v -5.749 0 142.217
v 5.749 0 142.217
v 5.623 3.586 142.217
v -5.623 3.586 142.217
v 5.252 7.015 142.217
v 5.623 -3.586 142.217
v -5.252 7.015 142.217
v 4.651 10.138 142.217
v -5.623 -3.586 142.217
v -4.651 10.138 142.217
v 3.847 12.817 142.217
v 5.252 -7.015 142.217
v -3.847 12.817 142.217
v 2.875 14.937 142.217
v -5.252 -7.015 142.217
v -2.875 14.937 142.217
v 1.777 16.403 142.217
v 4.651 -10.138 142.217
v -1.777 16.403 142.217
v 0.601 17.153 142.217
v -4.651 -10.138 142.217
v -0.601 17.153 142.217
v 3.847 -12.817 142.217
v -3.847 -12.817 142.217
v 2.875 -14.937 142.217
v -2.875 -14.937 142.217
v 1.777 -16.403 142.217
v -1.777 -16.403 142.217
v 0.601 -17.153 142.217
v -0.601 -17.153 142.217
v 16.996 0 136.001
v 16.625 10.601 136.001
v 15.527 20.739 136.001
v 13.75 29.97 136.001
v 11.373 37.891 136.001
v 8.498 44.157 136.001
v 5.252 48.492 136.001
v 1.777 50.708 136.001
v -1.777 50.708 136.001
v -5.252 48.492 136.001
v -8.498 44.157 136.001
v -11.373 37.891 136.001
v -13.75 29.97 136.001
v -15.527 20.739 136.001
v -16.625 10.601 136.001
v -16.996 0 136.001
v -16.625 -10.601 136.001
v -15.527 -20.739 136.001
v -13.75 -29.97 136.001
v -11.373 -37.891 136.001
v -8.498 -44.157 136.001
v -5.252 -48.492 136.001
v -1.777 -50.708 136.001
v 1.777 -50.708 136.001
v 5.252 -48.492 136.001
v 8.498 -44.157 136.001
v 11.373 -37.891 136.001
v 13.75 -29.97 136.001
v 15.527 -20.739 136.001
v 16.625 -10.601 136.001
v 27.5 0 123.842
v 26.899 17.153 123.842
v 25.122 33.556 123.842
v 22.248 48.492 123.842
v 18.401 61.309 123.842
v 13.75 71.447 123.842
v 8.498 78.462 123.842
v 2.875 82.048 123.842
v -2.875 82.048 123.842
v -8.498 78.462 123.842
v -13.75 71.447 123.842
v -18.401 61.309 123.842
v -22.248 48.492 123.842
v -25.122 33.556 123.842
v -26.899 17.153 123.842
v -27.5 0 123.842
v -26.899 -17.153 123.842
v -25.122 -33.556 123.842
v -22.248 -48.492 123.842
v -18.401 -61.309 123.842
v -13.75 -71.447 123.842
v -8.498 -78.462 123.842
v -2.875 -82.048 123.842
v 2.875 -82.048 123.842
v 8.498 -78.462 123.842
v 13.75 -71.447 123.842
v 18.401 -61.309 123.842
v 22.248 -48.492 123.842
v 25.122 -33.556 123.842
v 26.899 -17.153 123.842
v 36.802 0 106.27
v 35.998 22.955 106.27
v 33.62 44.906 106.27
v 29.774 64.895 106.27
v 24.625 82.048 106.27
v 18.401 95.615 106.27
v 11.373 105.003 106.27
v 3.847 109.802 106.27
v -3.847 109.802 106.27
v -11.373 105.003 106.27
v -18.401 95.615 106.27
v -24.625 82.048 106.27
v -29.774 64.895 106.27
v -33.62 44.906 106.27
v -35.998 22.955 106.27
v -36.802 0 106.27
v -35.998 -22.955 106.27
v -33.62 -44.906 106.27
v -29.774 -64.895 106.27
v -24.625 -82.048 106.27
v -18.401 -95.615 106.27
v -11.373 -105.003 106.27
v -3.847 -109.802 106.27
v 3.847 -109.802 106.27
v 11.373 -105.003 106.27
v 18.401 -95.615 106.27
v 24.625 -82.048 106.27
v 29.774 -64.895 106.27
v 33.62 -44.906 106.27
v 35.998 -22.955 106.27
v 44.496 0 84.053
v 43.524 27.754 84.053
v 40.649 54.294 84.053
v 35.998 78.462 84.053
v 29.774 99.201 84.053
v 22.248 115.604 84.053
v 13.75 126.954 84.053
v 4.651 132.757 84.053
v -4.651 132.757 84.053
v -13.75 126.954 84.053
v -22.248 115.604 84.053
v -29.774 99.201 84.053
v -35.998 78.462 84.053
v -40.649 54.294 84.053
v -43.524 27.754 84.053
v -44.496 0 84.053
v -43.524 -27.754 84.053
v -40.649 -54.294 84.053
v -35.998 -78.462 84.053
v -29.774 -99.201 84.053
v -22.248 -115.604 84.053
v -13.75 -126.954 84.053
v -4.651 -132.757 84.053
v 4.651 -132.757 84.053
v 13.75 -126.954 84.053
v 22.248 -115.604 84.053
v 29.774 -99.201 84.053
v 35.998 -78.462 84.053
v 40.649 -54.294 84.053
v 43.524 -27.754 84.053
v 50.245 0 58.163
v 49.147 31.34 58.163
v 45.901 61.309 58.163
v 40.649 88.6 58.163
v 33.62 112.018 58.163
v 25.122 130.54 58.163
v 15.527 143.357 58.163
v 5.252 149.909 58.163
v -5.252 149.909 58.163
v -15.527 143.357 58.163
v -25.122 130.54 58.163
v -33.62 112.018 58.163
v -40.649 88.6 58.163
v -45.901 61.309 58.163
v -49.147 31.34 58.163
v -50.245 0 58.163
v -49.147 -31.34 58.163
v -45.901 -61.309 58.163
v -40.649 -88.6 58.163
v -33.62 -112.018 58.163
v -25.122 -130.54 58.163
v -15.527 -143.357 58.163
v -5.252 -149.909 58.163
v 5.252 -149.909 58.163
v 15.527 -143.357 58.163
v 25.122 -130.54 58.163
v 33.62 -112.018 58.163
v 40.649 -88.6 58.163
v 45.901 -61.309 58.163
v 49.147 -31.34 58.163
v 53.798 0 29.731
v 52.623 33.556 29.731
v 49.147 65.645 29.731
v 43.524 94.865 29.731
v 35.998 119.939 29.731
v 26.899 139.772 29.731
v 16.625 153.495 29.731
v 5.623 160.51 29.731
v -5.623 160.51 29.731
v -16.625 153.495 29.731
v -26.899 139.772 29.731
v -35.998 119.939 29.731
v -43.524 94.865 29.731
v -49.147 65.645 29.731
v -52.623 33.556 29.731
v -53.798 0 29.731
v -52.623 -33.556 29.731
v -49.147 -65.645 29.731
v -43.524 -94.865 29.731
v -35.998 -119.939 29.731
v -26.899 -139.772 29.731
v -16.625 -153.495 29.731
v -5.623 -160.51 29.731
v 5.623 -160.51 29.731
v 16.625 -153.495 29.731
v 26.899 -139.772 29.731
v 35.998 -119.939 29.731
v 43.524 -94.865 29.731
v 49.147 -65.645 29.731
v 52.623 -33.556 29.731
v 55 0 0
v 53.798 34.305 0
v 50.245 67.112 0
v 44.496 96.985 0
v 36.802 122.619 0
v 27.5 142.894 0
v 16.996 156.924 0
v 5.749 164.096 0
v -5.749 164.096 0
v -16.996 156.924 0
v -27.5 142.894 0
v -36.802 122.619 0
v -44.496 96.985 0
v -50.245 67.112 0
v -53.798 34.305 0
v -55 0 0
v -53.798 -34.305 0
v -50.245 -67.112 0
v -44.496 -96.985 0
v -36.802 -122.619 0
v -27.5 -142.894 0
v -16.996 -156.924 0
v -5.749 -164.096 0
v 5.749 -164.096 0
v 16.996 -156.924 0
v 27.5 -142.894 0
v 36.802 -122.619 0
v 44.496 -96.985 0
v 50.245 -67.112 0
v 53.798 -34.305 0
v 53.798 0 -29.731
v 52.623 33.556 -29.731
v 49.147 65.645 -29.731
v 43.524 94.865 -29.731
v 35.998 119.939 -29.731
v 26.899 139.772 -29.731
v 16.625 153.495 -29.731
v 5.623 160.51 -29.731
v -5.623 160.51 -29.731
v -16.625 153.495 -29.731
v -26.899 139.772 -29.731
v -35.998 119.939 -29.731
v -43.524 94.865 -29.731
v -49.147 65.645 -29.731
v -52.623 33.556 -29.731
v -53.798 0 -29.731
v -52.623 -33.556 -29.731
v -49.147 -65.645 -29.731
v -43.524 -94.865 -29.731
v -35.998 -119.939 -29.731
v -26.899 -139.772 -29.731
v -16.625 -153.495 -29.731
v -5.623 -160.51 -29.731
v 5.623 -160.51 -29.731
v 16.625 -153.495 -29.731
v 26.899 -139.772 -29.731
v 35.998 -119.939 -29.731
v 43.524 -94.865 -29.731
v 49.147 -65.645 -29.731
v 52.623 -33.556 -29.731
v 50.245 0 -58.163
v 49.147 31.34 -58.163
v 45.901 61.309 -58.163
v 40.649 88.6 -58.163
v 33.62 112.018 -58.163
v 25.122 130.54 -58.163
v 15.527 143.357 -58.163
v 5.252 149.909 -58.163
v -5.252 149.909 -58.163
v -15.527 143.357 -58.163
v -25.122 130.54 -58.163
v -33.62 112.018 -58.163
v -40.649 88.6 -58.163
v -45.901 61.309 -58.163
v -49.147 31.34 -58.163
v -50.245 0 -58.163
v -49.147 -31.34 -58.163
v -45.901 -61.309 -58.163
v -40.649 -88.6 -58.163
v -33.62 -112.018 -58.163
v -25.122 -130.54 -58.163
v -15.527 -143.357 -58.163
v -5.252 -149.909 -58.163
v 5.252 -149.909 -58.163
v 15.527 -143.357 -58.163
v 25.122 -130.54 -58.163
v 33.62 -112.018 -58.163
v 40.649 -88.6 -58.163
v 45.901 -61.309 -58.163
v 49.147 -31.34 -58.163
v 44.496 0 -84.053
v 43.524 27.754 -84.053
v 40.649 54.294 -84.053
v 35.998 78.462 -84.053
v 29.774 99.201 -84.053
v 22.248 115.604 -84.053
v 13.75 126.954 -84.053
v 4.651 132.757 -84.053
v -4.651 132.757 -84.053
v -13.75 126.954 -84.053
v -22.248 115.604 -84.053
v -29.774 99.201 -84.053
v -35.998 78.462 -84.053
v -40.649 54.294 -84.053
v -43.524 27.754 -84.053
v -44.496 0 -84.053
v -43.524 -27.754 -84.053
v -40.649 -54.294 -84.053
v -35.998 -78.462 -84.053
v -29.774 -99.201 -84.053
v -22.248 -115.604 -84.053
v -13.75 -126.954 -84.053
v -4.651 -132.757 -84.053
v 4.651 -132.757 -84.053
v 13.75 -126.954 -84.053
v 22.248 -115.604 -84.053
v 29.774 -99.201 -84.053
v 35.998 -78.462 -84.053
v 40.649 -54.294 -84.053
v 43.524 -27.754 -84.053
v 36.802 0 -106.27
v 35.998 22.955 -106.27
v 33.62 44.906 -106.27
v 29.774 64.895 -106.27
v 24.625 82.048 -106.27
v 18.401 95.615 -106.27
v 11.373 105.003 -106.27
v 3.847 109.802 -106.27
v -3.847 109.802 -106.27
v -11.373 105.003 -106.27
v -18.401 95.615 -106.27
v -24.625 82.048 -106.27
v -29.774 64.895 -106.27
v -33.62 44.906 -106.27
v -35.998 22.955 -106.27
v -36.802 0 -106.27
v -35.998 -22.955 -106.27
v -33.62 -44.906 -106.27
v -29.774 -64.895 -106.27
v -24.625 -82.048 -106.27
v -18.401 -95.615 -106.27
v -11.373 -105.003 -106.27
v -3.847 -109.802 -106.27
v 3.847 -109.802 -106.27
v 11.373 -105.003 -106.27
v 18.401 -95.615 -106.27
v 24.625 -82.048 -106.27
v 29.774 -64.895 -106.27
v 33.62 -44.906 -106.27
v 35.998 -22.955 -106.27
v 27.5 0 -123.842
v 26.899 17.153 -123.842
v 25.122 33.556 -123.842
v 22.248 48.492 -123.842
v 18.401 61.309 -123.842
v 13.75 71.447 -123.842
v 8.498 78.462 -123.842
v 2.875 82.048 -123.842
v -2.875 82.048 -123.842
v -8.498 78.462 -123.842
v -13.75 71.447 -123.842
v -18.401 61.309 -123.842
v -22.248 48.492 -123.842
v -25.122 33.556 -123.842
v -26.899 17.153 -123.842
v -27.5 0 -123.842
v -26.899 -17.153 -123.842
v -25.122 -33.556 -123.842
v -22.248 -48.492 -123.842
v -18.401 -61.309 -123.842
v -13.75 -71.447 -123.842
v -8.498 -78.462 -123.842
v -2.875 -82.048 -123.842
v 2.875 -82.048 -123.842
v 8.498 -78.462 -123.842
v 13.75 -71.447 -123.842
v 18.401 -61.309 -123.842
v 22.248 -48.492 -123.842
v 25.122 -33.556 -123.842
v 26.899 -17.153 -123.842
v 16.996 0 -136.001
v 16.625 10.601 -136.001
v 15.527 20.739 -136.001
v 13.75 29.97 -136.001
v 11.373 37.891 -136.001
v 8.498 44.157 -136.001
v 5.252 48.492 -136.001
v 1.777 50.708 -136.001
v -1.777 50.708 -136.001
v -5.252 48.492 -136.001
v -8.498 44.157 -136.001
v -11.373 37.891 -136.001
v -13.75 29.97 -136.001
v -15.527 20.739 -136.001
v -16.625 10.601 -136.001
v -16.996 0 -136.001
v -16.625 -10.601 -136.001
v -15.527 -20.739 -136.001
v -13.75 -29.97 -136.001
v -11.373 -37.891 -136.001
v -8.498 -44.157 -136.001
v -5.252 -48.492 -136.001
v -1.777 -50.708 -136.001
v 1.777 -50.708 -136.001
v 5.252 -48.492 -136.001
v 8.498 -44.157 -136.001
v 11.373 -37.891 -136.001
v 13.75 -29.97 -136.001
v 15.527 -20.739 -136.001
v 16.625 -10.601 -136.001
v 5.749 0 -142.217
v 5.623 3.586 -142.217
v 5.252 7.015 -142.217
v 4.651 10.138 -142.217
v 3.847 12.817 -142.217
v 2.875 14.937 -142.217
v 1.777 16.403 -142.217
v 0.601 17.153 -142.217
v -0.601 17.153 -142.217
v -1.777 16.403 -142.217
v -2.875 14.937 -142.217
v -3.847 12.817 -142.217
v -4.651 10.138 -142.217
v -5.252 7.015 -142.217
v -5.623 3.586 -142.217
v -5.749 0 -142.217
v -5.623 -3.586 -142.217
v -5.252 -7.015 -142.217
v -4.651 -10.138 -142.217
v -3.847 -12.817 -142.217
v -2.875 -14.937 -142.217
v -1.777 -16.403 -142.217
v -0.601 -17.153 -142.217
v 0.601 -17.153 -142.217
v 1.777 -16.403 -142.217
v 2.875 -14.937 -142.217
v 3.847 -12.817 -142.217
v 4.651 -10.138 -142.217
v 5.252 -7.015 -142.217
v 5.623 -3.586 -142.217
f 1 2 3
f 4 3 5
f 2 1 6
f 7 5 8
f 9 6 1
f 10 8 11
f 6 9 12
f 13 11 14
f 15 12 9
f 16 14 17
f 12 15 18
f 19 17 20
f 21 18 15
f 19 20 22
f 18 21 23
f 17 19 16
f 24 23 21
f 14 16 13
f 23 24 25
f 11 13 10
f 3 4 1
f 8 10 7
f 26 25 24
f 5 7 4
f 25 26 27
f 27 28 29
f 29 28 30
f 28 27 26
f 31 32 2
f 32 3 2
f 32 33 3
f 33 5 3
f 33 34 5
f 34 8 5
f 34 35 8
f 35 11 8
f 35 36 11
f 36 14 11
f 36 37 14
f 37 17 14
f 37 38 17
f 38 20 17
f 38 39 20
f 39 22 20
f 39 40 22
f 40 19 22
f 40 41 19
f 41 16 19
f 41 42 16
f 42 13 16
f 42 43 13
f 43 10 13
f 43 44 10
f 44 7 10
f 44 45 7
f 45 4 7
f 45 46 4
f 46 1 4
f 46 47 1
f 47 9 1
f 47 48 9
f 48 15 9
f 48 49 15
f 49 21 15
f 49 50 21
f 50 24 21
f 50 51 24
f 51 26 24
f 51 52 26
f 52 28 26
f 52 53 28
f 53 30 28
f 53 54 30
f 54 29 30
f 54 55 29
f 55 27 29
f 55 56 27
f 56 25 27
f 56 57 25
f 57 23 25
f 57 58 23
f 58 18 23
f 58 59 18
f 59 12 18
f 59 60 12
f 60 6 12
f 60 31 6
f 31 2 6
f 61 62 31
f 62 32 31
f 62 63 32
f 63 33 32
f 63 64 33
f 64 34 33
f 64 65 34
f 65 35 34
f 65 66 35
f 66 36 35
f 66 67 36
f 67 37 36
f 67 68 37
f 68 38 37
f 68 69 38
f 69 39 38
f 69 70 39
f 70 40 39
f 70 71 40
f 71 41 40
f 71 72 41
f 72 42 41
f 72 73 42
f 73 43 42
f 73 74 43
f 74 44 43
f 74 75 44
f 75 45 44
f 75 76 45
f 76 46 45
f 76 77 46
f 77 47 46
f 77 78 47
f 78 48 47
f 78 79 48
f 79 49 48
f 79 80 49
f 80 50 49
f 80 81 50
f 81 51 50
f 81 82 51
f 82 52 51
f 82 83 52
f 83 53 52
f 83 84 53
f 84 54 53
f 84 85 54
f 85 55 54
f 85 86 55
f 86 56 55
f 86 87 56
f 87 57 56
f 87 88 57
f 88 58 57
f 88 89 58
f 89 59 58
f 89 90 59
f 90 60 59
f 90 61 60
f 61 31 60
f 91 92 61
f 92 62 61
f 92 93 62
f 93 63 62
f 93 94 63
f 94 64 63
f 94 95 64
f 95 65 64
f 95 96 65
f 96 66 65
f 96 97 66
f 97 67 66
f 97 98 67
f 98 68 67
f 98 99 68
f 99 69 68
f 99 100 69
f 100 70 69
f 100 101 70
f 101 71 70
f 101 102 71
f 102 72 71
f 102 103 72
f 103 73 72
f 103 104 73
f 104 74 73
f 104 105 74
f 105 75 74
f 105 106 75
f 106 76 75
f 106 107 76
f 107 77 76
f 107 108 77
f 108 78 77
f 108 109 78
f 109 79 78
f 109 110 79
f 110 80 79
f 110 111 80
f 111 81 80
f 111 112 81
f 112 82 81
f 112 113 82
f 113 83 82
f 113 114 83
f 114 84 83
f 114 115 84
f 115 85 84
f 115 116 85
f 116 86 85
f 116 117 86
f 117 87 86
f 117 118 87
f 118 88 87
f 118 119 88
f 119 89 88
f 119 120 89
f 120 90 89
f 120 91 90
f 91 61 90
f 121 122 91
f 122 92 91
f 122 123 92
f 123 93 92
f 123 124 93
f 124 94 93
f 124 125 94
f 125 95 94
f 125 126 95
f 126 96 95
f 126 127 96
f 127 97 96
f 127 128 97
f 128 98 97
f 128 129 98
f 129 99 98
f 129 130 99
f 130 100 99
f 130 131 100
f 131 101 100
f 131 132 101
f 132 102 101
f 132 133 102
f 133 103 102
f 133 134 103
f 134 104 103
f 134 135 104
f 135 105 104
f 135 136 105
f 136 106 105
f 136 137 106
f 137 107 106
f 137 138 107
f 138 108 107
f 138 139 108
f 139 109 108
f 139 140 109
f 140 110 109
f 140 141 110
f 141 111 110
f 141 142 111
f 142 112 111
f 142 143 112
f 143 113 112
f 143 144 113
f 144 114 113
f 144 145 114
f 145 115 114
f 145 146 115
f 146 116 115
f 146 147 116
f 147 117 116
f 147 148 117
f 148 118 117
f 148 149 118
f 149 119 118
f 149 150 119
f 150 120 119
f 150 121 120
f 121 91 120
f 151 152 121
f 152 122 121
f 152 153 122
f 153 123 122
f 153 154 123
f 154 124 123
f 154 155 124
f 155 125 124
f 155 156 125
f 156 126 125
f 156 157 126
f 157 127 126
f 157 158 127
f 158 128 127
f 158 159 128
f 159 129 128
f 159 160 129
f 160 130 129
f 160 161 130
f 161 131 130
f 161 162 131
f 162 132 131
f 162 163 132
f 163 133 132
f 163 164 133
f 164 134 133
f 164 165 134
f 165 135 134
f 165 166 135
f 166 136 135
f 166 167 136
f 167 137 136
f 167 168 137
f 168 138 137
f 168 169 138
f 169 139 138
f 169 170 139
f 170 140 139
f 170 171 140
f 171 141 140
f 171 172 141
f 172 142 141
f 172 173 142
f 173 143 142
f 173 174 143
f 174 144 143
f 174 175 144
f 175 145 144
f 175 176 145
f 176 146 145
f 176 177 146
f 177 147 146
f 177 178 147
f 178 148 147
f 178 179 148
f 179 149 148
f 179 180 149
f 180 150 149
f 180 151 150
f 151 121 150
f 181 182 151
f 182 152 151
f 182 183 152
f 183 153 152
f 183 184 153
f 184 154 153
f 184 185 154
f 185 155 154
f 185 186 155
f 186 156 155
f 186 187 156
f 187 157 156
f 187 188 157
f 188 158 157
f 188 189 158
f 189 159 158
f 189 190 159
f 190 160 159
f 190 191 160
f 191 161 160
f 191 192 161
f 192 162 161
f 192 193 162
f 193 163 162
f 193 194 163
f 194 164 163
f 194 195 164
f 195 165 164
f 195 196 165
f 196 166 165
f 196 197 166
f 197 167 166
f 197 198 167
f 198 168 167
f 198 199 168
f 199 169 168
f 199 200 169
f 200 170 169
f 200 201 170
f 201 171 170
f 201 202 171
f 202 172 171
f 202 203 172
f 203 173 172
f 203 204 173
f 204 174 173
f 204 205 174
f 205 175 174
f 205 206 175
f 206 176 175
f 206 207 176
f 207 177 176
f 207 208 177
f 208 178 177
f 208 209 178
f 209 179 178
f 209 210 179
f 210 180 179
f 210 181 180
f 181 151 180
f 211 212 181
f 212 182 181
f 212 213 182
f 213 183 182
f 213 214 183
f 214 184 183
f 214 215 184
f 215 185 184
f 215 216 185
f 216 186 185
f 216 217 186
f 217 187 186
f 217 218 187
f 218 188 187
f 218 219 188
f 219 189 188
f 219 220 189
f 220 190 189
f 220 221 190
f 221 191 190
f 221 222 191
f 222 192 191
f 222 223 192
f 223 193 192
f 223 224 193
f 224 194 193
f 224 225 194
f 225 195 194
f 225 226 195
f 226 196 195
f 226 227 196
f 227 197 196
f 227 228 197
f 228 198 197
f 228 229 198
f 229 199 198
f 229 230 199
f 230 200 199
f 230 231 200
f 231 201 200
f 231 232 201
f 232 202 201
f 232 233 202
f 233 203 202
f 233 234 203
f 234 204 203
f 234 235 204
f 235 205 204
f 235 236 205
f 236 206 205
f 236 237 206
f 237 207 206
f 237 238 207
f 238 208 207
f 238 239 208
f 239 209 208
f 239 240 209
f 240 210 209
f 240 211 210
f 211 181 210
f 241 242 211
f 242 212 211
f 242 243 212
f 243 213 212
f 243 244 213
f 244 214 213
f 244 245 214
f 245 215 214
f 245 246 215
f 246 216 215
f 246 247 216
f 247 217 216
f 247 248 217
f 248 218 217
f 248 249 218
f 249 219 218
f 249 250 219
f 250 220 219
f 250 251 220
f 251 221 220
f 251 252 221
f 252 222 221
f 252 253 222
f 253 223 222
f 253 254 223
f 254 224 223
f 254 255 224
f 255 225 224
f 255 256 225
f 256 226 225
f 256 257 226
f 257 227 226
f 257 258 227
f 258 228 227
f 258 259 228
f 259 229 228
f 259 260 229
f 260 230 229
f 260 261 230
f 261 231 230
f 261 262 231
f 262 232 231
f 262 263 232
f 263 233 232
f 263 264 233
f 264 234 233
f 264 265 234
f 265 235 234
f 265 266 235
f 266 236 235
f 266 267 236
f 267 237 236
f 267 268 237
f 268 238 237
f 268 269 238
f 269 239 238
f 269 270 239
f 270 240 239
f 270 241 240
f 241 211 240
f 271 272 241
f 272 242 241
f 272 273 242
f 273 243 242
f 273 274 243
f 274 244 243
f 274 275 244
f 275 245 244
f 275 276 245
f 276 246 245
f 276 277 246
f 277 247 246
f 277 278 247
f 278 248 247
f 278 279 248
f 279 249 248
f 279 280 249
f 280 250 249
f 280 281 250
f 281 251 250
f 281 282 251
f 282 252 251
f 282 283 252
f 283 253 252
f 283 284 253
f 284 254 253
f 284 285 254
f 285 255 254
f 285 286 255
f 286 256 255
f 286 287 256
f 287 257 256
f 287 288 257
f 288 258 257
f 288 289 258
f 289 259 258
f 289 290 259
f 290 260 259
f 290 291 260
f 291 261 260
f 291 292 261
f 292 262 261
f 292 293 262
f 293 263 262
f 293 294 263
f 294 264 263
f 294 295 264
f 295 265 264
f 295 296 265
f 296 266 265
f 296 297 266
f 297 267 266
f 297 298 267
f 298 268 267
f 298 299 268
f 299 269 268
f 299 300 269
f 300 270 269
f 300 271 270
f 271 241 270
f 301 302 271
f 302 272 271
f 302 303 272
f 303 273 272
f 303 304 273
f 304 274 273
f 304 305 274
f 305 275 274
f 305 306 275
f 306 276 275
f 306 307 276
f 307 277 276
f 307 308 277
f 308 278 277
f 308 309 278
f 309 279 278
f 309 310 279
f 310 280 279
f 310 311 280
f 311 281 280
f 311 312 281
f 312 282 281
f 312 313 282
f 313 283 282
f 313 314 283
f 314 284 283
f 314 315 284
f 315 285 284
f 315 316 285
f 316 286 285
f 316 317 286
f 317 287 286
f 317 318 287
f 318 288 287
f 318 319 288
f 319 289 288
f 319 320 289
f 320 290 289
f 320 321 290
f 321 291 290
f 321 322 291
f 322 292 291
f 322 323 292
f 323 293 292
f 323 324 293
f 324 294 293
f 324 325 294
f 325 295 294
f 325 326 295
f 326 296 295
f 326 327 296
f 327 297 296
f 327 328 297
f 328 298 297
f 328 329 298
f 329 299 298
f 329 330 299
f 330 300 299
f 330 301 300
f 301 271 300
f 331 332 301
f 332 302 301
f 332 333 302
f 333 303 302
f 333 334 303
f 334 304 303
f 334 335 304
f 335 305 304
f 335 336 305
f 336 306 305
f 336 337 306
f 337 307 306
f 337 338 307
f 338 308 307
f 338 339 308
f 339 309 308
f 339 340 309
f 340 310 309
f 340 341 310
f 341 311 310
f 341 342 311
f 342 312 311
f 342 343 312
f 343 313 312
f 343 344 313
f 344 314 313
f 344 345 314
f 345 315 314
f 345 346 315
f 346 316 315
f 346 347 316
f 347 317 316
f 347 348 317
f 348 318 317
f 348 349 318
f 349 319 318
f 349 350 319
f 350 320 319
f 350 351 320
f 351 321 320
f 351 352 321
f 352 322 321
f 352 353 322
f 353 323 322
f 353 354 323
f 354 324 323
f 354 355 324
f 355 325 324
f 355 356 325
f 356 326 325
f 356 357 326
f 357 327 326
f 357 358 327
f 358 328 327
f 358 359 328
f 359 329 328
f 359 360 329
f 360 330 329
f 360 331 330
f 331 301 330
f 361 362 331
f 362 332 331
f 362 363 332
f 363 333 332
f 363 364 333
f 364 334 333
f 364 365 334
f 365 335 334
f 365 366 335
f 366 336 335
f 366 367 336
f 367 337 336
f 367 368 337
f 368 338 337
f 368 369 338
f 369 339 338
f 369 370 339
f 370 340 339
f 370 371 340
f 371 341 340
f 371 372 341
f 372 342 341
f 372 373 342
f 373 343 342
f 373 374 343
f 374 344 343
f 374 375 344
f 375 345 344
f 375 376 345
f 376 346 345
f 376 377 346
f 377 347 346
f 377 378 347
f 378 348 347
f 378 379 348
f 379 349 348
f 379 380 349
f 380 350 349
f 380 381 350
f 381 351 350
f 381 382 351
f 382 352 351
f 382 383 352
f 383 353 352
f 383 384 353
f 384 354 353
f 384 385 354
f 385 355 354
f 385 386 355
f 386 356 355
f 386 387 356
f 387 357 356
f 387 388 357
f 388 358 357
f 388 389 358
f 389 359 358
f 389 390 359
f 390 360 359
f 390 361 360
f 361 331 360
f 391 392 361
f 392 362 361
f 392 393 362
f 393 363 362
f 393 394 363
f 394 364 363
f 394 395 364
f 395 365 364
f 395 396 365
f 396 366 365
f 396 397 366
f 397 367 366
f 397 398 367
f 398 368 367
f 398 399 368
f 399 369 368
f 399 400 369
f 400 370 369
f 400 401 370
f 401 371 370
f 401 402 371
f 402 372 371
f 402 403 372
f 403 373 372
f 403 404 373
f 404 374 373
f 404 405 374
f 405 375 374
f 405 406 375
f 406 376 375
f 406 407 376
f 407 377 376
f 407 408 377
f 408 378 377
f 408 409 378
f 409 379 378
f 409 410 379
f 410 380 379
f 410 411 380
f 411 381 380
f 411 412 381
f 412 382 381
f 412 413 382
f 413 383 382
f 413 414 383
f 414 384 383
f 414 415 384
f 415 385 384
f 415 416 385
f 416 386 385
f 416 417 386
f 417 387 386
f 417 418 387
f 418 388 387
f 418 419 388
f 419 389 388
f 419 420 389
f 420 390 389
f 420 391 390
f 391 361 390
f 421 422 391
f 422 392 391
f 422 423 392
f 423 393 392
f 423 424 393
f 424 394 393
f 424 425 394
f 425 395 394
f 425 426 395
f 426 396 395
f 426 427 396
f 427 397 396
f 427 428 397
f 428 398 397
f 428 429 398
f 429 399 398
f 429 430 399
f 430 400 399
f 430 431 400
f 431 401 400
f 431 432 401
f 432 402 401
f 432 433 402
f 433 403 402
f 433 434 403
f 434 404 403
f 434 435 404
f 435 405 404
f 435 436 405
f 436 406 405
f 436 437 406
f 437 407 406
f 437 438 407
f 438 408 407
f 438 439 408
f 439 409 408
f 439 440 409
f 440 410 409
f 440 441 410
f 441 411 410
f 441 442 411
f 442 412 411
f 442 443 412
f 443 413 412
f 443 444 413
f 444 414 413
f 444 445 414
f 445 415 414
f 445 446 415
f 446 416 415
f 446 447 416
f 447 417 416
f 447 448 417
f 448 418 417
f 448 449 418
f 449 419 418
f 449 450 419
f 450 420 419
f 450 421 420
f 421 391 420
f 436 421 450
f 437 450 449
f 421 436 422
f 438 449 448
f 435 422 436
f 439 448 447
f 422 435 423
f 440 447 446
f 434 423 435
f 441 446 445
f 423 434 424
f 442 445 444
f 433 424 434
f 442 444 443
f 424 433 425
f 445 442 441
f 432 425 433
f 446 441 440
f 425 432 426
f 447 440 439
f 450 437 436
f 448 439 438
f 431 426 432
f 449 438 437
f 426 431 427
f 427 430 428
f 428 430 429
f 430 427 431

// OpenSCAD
// Generated by SolidPython 1.0.1 on 2020-07-29 00:46:46


scale(v = [5, 15, 13]) {
	sphere(r = 11);
}
/***********************************************
*********      SolidPython code:      **********
************************************************
 
# import packages: SolidPython
from solid import *
from solid.utils import *
from itertools import chain, combinations, permutations


class Resize:

    def __init__(self, scad_file):
        self.scad_file = scad_file
        #self.scad_file = import_scad(scad_file)
        # cone/cylinder param:
        self.r1 = 0
        self.r2 = 0
        self.h = 0
        # rectangular prism param:
        self.w = 0
        self.l = 0
        # ellipse param:
        self.r = 0

    # import OpenScad code (file name corresponds to shape)


    # classify shape + parameters
    def assign(self, param1, param2, param3):
        if self.scad_file == 'cone.scad':
            self.r1 = param1
            self.r2 = param2
            self.h = param3
        elif self.scad_file == 'cylinder.scad':
            self.r1 = param1
            self.r2 = param2
            self.h = param3
        elif self.scad_file == 'rectangularPrism.scad':
            self.h = param1
            self.l = param2
            self.w = param3
        else:
            self.r = param1
            self.h = param2

    # resize parameters
    def iterate(self):
        x = range(3, 20, 2)
        i = 1
        if self.scad_file == 'cone.scad':
            tempList = list(permutations(x, 2))
            for temp in tempList:
                param1 = temp[0]
                param2 = temp[1]
                filepath = 'produced_scad_files/' + 'cone' + str(param1) + '_' + str(param2) + '_' + '.scad'
                scad_render_to_file(cylinder(h=param1, r1=param2, r2=0), filepath)

        elif self.scad_file == 'cylinder.scad':
            tempList = list(permutations(x, 3))
            for temp in tempList:
                param1 = temp[0]
                param2 = temp[1]
                filepath = 'produced_scad_files/' + 'cylinder' + str(param1) + '_' + str(param2) + '_' + '.scad'
                scad_render_to_file(cylinder(h=param1, r1=param2, r2=param2), filepath)

        elif self.scad_file == 'rectangularPrism.scad':
            tempList = list(permutations(x, 3))
            for temp in tempList:
                param1 = temp[0]
                param2 = temp[1]
                param3 = temp[2]
                filepath = 'produced_scad_files/' + 'rectangularPrism' + str(param1) + '_' + str(param2) + '_' + str(
                    param3) + '.scad'
                scad_render_to_file(cube(size=(param1, param2, param3)), filepath)

        elif self.scad_file == 'ellipse.scad':
            tempList = list(permutations(x, 4))
            for temp in tempList:
                param1 = temp[0]
                param2 = temp[1]
                param3 = temp[2]
                param4 = temp[3]
                filepath = 'produced_scad_files/' + 'ellipse' + str(param1) + '_' + str(param2) + '_' + str(param3) + '_' + str(param4) + '.scad'
                scad_render_to_file(scale([param1, param2, param3])(sphere(r=param4)), filepath)

    def render_to_scadfile(self):
        scad_render_to_file(scad, 'example.scad') 
 
************************************************/
